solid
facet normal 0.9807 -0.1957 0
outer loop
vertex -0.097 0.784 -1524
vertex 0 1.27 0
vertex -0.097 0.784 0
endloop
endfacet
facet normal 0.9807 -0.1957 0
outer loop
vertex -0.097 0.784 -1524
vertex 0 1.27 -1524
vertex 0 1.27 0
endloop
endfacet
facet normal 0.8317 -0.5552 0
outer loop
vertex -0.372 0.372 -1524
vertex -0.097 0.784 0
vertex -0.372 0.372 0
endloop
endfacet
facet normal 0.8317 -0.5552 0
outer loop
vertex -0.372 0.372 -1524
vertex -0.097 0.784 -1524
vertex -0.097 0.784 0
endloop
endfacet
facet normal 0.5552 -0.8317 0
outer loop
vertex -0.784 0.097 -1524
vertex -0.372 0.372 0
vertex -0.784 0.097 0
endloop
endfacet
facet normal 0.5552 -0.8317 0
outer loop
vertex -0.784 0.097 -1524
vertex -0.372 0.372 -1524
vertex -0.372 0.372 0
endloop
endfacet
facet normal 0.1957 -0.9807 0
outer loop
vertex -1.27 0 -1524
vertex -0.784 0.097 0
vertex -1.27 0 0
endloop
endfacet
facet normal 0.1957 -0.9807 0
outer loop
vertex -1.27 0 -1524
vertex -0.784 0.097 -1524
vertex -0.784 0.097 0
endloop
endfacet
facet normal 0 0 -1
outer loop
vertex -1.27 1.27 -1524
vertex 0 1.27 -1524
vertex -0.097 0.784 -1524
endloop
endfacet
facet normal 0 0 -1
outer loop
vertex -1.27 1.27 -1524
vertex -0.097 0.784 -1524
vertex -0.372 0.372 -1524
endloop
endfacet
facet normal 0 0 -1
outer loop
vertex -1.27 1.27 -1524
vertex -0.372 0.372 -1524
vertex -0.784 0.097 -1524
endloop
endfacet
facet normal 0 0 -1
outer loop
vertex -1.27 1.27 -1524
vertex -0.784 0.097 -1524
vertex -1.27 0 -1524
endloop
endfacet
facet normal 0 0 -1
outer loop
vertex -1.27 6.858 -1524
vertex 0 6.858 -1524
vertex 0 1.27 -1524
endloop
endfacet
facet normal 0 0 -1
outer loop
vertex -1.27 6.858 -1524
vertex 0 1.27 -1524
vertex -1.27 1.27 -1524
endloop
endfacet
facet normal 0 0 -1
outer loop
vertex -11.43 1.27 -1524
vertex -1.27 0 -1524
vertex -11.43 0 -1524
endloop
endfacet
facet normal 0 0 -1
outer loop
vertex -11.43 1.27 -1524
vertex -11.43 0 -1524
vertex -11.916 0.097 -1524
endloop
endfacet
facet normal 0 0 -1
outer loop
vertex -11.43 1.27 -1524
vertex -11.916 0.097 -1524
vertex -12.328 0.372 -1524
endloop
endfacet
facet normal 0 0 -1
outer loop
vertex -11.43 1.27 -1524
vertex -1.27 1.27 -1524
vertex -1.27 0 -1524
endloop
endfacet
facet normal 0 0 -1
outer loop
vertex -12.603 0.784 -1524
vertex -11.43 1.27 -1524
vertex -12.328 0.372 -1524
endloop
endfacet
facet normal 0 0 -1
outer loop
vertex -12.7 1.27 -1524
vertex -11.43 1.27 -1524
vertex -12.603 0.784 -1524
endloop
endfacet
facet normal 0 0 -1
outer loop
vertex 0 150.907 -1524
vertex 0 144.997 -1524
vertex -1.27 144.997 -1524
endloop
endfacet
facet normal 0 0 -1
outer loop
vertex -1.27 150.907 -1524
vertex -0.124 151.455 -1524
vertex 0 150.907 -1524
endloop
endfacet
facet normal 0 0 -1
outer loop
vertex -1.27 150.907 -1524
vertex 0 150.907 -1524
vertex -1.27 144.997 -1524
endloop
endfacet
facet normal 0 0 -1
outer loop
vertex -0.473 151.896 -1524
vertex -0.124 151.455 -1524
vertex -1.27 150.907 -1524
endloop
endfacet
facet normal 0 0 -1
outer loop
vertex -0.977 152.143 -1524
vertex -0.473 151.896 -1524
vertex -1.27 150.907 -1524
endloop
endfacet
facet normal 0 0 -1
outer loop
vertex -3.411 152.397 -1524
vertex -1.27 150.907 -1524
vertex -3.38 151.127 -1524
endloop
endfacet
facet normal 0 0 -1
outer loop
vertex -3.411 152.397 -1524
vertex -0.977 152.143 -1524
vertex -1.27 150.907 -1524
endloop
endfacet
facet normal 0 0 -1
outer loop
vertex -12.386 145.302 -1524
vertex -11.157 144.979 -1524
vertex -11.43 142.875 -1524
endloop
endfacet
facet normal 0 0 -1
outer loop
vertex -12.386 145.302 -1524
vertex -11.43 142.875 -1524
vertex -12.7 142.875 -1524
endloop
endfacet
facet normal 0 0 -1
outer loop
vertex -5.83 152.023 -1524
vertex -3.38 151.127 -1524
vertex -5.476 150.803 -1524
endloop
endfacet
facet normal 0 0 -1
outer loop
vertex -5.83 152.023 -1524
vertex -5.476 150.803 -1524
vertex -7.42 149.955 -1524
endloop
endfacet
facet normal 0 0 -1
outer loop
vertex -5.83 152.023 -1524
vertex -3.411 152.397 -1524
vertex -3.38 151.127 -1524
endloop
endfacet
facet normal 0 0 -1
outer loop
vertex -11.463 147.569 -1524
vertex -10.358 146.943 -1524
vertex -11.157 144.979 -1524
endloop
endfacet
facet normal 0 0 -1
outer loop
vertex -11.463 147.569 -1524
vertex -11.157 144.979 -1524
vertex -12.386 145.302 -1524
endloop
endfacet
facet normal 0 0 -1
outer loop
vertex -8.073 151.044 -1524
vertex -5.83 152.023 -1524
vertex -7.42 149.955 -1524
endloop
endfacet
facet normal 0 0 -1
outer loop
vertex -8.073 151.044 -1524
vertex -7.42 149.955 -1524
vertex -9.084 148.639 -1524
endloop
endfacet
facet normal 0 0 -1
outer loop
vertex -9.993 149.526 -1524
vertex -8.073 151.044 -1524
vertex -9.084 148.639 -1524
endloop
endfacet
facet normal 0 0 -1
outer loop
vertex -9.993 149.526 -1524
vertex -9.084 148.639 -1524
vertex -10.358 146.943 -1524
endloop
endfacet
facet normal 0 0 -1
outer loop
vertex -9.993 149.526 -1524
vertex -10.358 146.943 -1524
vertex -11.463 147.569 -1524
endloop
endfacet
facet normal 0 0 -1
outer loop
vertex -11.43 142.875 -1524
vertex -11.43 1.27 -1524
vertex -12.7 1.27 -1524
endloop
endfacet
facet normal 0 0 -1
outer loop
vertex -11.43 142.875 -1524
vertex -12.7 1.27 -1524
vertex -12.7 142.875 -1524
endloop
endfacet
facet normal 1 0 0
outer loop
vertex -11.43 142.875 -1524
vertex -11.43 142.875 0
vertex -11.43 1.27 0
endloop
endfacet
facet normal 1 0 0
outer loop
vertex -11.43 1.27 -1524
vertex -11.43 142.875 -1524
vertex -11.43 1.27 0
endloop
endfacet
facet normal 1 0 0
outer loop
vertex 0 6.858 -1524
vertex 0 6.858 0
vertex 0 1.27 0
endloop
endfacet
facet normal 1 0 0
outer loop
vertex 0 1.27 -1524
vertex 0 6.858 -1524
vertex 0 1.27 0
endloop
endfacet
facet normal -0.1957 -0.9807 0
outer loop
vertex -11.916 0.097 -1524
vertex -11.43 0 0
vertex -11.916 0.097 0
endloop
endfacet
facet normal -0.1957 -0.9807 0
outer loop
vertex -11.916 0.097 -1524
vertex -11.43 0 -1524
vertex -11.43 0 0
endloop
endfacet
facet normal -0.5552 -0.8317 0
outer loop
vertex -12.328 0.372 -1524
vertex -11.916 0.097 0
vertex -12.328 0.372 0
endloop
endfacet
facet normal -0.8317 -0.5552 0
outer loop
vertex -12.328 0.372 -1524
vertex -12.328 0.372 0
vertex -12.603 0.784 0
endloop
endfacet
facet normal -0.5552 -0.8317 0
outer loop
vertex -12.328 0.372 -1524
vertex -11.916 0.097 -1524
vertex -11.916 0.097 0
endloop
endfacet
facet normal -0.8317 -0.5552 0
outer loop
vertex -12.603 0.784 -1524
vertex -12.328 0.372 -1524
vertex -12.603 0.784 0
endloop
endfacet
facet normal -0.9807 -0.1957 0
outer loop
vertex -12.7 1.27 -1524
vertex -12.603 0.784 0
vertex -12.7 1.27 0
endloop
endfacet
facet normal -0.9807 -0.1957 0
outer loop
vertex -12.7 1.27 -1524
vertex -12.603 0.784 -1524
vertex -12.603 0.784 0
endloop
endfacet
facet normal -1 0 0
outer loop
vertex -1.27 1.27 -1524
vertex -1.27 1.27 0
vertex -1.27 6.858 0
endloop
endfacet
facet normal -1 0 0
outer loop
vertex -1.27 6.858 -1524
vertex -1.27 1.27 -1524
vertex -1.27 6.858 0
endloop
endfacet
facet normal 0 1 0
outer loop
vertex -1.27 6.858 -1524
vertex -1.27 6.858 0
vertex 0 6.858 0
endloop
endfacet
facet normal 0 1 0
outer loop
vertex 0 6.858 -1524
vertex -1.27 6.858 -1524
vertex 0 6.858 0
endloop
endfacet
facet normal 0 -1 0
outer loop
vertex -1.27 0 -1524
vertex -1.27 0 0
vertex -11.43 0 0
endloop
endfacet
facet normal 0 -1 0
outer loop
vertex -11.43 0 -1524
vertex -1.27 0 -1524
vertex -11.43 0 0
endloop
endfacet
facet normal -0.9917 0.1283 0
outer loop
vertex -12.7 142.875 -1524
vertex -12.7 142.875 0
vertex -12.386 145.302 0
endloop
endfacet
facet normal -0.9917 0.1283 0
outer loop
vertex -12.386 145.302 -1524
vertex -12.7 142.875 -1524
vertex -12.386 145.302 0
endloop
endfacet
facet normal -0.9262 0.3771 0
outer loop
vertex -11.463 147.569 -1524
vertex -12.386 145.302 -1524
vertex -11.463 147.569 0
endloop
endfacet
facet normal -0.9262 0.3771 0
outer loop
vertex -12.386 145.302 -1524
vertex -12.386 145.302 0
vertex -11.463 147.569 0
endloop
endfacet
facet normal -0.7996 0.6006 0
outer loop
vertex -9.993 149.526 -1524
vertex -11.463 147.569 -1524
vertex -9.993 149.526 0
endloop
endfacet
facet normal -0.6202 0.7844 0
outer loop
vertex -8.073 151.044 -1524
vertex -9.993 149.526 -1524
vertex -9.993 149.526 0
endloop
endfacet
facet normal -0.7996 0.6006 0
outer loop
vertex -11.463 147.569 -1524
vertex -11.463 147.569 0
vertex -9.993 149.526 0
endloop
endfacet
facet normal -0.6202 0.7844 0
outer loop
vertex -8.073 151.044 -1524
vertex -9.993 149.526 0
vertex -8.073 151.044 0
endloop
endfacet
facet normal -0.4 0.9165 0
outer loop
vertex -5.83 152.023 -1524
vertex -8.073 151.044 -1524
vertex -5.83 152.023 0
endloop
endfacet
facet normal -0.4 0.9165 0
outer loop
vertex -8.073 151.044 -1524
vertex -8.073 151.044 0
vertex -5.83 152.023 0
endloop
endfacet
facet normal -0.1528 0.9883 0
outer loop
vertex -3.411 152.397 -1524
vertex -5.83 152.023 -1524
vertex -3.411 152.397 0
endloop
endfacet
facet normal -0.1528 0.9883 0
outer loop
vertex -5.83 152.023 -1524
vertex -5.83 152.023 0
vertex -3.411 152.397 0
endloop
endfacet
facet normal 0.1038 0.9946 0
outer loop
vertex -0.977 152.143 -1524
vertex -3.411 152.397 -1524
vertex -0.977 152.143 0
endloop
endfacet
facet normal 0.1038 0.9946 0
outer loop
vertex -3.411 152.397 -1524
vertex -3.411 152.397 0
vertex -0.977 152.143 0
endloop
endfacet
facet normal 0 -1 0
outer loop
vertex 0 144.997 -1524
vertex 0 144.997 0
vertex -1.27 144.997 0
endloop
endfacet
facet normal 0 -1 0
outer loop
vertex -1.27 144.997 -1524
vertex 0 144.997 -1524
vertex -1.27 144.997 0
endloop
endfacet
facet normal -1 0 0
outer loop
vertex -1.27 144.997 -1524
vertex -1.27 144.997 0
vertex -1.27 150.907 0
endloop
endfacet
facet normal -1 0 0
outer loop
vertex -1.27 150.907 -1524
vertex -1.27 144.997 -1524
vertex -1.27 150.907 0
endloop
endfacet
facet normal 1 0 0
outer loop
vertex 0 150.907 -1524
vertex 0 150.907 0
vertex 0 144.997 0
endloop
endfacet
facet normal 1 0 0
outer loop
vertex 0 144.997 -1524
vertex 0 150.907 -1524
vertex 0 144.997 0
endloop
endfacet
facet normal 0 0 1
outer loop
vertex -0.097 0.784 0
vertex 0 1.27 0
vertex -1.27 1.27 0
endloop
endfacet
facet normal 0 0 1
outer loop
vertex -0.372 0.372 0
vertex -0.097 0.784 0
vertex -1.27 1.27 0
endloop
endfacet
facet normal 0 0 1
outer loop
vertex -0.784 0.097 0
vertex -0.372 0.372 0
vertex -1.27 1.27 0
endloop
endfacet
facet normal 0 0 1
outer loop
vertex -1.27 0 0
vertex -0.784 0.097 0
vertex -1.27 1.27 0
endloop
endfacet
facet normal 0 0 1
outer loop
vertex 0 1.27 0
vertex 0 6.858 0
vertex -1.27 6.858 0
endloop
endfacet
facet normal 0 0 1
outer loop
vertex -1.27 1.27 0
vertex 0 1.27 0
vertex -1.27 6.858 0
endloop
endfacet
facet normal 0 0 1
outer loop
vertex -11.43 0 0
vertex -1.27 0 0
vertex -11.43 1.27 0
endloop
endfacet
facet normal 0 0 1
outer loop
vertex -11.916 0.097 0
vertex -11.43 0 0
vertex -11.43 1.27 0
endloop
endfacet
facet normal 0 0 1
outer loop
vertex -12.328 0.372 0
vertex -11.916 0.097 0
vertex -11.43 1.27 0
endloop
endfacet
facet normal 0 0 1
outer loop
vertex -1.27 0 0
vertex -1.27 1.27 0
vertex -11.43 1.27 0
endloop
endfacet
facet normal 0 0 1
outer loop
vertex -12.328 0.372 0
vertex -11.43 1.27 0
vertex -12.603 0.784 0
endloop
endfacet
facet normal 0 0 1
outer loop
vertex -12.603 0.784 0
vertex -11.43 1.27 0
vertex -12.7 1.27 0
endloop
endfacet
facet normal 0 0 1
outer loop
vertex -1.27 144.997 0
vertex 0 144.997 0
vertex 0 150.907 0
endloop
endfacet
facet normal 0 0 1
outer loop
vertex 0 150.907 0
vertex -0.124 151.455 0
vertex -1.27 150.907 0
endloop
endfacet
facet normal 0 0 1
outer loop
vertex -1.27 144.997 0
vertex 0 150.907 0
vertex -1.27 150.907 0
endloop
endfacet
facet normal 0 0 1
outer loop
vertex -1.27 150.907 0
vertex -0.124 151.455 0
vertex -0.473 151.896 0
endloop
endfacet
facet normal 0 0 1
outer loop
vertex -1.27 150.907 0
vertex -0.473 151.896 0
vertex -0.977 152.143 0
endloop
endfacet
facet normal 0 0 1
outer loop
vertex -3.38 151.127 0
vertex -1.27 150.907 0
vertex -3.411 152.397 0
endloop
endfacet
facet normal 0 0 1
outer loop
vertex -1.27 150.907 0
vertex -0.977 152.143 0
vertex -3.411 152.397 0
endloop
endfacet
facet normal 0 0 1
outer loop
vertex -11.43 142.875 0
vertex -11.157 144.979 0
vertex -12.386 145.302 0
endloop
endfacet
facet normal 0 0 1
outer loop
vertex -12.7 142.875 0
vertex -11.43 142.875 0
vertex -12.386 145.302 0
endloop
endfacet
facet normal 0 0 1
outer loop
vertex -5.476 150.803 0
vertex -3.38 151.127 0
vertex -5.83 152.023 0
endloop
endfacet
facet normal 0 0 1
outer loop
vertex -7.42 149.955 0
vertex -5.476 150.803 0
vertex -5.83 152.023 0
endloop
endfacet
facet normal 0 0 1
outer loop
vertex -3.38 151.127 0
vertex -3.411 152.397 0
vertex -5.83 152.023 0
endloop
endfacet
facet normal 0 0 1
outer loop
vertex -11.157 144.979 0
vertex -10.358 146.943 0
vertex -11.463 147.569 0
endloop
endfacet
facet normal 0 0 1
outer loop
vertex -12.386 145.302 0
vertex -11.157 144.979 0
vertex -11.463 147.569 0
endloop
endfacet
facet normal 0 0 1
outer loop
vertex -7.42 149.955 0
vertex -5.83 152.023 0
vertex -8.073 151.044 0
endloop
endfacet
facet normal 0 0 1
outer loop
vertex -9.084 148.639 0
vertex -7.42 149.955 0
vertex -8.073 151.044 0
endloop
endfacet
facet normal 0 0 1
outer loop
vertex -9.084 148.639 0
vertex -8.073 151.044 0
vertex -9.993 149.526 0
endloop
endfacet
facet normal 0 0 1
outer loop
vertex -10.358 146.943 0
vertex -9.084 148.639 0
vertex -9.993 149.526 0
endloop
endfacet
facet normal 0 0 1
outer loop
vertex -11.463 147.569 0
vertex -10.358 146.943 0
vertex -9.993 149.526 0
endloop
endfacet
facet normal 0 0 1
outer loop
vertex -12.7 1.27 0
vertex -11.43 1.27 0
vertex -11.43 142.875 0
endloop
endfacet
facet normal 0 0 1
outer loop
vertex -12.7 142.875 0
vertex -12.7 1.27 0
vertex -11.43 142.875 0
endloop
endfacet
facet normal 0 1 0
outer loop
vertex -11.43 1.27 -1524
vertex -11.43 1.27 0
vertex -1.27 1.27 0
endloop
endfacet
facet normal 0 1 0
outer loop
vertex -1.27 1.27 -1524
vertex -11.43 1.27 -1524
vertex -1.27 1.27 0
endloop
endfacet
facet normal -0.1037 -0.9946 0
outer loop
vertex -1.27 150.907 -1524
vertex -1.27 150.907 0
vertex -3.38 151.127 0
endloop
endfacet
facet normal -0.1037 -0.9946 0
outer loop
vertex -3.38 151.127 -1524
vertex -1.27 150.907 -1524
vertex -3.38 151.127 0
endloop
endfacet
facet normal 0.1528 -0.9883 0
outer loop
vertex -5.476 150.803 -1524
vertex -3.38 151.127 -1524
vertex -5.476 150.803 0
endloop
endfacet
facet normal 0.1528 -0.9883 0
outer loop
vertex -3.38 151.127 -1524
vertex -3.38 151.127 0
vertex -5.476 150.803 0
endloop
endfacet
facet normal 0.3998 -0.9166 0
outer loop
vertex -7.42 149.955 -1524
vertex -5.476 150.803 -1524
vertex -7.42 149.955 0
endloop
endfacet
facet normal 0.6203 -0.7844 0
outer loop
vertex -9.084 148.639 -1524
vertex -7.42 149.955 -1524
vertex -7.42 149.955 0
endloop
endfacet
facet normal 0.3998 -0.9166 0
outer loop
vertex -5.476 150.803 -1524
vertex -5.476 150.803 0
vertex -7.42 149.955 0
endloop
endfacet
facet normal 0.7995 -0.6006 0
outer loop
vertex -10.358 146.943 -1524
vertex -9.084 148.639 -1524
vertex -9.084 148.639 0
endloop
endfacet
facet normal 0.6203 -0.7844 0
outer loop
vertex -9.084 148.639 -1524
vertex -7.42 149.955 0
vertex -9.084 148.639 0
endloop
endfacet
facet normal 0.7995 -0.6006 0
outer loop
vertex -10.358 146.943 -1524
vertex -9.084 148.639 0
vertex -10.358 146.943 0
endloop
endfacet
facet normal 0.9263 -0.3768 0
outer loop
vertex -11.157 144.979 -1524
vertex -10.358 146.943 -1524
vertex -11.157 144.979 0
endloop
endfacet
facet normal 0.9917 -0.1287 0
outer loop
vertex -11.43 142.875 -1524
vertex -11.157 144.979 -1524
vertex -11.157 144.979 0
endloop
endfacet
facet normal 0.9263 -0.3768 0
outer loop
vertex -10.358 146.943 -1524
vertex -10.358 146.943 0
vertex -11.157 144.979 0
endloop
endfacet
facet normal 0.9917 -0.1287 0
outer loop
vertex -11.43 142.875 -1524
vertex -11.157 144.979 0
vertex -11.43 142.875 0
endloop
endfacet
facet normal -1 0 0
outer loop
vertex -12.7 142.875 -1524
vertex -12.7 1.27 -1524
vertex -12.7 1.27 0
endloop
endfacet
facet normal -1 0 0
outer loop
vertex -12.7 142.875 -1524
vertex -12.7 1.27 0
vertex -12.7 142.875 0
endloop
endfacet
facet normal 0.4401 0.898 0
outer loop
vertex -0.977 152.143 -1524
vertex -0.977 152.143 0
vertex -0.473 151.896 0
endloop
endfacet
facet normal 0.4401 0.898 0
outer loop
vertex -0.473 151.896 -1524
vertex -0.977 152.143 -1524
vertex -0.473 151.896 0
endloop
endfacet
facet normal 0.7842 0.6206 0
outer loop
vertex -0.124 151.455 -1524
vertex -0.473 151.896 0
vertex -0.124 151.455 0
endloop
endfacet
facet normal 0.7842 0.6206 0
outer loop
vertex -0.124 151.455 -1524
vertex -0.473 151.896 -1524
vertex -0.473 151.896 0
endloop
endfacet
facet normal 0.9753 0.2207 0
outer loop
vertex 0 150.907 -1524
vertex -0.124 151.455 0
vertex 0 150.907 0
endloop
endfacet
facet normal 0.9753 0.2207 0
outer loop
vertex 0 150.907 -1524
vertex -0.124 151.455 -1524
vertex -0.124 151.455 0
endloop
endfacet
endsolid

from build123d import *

# Parameters (mm, degrees)
EXTRUDE_THIN1_DEPTH = 1524
FILLET1_R           = 1.27


with BuildPart() as part:
    # Sketch1 → Extrude-Thin1 (new body)
    with BuildSketch(Plane.XY):
        with BuildLine():
            Line((0, 6.858), (0, 0))
            Line((0, 0), (-12.7, 0))
            Line((-12.7, 0), (-12.7, 142.875))
            ThreePointArc((-12.7, 142.875), (-8.674261314, 150.652129933), (0, 151.855256121))
            Line((0, 151.855256121), (0, 144.997256121))
            Line((0, 144.997256121), (-1.27, 144.997256121))
            Line((-1.27, 144.997256121), (-1.27, 150.907185257))
            ThreePointArc((-1.27, 150.907185257), (-8.29453367, 149.350754782), (-11.43, 142.875))
            Line((-11.43, 142.875), (-11.43, 1.27))
            Line((-11.43, 1.27), (-1.27, 1.27))
            Line((-1.27, 1.27), (-1.27, 6.858))
            Line((-1.27, 6.858), (0, 6.858))
        make_face()
    extrude(amount=-EXTRUDE_THIN1_DEPTH)

    # Fillet1
    fillet1_edges = [part.edges().sort_by_distance(p)[0] for p in [
        (0, 0, -762),
        (-12.7, 0, -762),
        (0, 151.855256121, -762),
    ]]
    fillet(fillet1_edges, radius=FILLET1_R)


solid = part.part
